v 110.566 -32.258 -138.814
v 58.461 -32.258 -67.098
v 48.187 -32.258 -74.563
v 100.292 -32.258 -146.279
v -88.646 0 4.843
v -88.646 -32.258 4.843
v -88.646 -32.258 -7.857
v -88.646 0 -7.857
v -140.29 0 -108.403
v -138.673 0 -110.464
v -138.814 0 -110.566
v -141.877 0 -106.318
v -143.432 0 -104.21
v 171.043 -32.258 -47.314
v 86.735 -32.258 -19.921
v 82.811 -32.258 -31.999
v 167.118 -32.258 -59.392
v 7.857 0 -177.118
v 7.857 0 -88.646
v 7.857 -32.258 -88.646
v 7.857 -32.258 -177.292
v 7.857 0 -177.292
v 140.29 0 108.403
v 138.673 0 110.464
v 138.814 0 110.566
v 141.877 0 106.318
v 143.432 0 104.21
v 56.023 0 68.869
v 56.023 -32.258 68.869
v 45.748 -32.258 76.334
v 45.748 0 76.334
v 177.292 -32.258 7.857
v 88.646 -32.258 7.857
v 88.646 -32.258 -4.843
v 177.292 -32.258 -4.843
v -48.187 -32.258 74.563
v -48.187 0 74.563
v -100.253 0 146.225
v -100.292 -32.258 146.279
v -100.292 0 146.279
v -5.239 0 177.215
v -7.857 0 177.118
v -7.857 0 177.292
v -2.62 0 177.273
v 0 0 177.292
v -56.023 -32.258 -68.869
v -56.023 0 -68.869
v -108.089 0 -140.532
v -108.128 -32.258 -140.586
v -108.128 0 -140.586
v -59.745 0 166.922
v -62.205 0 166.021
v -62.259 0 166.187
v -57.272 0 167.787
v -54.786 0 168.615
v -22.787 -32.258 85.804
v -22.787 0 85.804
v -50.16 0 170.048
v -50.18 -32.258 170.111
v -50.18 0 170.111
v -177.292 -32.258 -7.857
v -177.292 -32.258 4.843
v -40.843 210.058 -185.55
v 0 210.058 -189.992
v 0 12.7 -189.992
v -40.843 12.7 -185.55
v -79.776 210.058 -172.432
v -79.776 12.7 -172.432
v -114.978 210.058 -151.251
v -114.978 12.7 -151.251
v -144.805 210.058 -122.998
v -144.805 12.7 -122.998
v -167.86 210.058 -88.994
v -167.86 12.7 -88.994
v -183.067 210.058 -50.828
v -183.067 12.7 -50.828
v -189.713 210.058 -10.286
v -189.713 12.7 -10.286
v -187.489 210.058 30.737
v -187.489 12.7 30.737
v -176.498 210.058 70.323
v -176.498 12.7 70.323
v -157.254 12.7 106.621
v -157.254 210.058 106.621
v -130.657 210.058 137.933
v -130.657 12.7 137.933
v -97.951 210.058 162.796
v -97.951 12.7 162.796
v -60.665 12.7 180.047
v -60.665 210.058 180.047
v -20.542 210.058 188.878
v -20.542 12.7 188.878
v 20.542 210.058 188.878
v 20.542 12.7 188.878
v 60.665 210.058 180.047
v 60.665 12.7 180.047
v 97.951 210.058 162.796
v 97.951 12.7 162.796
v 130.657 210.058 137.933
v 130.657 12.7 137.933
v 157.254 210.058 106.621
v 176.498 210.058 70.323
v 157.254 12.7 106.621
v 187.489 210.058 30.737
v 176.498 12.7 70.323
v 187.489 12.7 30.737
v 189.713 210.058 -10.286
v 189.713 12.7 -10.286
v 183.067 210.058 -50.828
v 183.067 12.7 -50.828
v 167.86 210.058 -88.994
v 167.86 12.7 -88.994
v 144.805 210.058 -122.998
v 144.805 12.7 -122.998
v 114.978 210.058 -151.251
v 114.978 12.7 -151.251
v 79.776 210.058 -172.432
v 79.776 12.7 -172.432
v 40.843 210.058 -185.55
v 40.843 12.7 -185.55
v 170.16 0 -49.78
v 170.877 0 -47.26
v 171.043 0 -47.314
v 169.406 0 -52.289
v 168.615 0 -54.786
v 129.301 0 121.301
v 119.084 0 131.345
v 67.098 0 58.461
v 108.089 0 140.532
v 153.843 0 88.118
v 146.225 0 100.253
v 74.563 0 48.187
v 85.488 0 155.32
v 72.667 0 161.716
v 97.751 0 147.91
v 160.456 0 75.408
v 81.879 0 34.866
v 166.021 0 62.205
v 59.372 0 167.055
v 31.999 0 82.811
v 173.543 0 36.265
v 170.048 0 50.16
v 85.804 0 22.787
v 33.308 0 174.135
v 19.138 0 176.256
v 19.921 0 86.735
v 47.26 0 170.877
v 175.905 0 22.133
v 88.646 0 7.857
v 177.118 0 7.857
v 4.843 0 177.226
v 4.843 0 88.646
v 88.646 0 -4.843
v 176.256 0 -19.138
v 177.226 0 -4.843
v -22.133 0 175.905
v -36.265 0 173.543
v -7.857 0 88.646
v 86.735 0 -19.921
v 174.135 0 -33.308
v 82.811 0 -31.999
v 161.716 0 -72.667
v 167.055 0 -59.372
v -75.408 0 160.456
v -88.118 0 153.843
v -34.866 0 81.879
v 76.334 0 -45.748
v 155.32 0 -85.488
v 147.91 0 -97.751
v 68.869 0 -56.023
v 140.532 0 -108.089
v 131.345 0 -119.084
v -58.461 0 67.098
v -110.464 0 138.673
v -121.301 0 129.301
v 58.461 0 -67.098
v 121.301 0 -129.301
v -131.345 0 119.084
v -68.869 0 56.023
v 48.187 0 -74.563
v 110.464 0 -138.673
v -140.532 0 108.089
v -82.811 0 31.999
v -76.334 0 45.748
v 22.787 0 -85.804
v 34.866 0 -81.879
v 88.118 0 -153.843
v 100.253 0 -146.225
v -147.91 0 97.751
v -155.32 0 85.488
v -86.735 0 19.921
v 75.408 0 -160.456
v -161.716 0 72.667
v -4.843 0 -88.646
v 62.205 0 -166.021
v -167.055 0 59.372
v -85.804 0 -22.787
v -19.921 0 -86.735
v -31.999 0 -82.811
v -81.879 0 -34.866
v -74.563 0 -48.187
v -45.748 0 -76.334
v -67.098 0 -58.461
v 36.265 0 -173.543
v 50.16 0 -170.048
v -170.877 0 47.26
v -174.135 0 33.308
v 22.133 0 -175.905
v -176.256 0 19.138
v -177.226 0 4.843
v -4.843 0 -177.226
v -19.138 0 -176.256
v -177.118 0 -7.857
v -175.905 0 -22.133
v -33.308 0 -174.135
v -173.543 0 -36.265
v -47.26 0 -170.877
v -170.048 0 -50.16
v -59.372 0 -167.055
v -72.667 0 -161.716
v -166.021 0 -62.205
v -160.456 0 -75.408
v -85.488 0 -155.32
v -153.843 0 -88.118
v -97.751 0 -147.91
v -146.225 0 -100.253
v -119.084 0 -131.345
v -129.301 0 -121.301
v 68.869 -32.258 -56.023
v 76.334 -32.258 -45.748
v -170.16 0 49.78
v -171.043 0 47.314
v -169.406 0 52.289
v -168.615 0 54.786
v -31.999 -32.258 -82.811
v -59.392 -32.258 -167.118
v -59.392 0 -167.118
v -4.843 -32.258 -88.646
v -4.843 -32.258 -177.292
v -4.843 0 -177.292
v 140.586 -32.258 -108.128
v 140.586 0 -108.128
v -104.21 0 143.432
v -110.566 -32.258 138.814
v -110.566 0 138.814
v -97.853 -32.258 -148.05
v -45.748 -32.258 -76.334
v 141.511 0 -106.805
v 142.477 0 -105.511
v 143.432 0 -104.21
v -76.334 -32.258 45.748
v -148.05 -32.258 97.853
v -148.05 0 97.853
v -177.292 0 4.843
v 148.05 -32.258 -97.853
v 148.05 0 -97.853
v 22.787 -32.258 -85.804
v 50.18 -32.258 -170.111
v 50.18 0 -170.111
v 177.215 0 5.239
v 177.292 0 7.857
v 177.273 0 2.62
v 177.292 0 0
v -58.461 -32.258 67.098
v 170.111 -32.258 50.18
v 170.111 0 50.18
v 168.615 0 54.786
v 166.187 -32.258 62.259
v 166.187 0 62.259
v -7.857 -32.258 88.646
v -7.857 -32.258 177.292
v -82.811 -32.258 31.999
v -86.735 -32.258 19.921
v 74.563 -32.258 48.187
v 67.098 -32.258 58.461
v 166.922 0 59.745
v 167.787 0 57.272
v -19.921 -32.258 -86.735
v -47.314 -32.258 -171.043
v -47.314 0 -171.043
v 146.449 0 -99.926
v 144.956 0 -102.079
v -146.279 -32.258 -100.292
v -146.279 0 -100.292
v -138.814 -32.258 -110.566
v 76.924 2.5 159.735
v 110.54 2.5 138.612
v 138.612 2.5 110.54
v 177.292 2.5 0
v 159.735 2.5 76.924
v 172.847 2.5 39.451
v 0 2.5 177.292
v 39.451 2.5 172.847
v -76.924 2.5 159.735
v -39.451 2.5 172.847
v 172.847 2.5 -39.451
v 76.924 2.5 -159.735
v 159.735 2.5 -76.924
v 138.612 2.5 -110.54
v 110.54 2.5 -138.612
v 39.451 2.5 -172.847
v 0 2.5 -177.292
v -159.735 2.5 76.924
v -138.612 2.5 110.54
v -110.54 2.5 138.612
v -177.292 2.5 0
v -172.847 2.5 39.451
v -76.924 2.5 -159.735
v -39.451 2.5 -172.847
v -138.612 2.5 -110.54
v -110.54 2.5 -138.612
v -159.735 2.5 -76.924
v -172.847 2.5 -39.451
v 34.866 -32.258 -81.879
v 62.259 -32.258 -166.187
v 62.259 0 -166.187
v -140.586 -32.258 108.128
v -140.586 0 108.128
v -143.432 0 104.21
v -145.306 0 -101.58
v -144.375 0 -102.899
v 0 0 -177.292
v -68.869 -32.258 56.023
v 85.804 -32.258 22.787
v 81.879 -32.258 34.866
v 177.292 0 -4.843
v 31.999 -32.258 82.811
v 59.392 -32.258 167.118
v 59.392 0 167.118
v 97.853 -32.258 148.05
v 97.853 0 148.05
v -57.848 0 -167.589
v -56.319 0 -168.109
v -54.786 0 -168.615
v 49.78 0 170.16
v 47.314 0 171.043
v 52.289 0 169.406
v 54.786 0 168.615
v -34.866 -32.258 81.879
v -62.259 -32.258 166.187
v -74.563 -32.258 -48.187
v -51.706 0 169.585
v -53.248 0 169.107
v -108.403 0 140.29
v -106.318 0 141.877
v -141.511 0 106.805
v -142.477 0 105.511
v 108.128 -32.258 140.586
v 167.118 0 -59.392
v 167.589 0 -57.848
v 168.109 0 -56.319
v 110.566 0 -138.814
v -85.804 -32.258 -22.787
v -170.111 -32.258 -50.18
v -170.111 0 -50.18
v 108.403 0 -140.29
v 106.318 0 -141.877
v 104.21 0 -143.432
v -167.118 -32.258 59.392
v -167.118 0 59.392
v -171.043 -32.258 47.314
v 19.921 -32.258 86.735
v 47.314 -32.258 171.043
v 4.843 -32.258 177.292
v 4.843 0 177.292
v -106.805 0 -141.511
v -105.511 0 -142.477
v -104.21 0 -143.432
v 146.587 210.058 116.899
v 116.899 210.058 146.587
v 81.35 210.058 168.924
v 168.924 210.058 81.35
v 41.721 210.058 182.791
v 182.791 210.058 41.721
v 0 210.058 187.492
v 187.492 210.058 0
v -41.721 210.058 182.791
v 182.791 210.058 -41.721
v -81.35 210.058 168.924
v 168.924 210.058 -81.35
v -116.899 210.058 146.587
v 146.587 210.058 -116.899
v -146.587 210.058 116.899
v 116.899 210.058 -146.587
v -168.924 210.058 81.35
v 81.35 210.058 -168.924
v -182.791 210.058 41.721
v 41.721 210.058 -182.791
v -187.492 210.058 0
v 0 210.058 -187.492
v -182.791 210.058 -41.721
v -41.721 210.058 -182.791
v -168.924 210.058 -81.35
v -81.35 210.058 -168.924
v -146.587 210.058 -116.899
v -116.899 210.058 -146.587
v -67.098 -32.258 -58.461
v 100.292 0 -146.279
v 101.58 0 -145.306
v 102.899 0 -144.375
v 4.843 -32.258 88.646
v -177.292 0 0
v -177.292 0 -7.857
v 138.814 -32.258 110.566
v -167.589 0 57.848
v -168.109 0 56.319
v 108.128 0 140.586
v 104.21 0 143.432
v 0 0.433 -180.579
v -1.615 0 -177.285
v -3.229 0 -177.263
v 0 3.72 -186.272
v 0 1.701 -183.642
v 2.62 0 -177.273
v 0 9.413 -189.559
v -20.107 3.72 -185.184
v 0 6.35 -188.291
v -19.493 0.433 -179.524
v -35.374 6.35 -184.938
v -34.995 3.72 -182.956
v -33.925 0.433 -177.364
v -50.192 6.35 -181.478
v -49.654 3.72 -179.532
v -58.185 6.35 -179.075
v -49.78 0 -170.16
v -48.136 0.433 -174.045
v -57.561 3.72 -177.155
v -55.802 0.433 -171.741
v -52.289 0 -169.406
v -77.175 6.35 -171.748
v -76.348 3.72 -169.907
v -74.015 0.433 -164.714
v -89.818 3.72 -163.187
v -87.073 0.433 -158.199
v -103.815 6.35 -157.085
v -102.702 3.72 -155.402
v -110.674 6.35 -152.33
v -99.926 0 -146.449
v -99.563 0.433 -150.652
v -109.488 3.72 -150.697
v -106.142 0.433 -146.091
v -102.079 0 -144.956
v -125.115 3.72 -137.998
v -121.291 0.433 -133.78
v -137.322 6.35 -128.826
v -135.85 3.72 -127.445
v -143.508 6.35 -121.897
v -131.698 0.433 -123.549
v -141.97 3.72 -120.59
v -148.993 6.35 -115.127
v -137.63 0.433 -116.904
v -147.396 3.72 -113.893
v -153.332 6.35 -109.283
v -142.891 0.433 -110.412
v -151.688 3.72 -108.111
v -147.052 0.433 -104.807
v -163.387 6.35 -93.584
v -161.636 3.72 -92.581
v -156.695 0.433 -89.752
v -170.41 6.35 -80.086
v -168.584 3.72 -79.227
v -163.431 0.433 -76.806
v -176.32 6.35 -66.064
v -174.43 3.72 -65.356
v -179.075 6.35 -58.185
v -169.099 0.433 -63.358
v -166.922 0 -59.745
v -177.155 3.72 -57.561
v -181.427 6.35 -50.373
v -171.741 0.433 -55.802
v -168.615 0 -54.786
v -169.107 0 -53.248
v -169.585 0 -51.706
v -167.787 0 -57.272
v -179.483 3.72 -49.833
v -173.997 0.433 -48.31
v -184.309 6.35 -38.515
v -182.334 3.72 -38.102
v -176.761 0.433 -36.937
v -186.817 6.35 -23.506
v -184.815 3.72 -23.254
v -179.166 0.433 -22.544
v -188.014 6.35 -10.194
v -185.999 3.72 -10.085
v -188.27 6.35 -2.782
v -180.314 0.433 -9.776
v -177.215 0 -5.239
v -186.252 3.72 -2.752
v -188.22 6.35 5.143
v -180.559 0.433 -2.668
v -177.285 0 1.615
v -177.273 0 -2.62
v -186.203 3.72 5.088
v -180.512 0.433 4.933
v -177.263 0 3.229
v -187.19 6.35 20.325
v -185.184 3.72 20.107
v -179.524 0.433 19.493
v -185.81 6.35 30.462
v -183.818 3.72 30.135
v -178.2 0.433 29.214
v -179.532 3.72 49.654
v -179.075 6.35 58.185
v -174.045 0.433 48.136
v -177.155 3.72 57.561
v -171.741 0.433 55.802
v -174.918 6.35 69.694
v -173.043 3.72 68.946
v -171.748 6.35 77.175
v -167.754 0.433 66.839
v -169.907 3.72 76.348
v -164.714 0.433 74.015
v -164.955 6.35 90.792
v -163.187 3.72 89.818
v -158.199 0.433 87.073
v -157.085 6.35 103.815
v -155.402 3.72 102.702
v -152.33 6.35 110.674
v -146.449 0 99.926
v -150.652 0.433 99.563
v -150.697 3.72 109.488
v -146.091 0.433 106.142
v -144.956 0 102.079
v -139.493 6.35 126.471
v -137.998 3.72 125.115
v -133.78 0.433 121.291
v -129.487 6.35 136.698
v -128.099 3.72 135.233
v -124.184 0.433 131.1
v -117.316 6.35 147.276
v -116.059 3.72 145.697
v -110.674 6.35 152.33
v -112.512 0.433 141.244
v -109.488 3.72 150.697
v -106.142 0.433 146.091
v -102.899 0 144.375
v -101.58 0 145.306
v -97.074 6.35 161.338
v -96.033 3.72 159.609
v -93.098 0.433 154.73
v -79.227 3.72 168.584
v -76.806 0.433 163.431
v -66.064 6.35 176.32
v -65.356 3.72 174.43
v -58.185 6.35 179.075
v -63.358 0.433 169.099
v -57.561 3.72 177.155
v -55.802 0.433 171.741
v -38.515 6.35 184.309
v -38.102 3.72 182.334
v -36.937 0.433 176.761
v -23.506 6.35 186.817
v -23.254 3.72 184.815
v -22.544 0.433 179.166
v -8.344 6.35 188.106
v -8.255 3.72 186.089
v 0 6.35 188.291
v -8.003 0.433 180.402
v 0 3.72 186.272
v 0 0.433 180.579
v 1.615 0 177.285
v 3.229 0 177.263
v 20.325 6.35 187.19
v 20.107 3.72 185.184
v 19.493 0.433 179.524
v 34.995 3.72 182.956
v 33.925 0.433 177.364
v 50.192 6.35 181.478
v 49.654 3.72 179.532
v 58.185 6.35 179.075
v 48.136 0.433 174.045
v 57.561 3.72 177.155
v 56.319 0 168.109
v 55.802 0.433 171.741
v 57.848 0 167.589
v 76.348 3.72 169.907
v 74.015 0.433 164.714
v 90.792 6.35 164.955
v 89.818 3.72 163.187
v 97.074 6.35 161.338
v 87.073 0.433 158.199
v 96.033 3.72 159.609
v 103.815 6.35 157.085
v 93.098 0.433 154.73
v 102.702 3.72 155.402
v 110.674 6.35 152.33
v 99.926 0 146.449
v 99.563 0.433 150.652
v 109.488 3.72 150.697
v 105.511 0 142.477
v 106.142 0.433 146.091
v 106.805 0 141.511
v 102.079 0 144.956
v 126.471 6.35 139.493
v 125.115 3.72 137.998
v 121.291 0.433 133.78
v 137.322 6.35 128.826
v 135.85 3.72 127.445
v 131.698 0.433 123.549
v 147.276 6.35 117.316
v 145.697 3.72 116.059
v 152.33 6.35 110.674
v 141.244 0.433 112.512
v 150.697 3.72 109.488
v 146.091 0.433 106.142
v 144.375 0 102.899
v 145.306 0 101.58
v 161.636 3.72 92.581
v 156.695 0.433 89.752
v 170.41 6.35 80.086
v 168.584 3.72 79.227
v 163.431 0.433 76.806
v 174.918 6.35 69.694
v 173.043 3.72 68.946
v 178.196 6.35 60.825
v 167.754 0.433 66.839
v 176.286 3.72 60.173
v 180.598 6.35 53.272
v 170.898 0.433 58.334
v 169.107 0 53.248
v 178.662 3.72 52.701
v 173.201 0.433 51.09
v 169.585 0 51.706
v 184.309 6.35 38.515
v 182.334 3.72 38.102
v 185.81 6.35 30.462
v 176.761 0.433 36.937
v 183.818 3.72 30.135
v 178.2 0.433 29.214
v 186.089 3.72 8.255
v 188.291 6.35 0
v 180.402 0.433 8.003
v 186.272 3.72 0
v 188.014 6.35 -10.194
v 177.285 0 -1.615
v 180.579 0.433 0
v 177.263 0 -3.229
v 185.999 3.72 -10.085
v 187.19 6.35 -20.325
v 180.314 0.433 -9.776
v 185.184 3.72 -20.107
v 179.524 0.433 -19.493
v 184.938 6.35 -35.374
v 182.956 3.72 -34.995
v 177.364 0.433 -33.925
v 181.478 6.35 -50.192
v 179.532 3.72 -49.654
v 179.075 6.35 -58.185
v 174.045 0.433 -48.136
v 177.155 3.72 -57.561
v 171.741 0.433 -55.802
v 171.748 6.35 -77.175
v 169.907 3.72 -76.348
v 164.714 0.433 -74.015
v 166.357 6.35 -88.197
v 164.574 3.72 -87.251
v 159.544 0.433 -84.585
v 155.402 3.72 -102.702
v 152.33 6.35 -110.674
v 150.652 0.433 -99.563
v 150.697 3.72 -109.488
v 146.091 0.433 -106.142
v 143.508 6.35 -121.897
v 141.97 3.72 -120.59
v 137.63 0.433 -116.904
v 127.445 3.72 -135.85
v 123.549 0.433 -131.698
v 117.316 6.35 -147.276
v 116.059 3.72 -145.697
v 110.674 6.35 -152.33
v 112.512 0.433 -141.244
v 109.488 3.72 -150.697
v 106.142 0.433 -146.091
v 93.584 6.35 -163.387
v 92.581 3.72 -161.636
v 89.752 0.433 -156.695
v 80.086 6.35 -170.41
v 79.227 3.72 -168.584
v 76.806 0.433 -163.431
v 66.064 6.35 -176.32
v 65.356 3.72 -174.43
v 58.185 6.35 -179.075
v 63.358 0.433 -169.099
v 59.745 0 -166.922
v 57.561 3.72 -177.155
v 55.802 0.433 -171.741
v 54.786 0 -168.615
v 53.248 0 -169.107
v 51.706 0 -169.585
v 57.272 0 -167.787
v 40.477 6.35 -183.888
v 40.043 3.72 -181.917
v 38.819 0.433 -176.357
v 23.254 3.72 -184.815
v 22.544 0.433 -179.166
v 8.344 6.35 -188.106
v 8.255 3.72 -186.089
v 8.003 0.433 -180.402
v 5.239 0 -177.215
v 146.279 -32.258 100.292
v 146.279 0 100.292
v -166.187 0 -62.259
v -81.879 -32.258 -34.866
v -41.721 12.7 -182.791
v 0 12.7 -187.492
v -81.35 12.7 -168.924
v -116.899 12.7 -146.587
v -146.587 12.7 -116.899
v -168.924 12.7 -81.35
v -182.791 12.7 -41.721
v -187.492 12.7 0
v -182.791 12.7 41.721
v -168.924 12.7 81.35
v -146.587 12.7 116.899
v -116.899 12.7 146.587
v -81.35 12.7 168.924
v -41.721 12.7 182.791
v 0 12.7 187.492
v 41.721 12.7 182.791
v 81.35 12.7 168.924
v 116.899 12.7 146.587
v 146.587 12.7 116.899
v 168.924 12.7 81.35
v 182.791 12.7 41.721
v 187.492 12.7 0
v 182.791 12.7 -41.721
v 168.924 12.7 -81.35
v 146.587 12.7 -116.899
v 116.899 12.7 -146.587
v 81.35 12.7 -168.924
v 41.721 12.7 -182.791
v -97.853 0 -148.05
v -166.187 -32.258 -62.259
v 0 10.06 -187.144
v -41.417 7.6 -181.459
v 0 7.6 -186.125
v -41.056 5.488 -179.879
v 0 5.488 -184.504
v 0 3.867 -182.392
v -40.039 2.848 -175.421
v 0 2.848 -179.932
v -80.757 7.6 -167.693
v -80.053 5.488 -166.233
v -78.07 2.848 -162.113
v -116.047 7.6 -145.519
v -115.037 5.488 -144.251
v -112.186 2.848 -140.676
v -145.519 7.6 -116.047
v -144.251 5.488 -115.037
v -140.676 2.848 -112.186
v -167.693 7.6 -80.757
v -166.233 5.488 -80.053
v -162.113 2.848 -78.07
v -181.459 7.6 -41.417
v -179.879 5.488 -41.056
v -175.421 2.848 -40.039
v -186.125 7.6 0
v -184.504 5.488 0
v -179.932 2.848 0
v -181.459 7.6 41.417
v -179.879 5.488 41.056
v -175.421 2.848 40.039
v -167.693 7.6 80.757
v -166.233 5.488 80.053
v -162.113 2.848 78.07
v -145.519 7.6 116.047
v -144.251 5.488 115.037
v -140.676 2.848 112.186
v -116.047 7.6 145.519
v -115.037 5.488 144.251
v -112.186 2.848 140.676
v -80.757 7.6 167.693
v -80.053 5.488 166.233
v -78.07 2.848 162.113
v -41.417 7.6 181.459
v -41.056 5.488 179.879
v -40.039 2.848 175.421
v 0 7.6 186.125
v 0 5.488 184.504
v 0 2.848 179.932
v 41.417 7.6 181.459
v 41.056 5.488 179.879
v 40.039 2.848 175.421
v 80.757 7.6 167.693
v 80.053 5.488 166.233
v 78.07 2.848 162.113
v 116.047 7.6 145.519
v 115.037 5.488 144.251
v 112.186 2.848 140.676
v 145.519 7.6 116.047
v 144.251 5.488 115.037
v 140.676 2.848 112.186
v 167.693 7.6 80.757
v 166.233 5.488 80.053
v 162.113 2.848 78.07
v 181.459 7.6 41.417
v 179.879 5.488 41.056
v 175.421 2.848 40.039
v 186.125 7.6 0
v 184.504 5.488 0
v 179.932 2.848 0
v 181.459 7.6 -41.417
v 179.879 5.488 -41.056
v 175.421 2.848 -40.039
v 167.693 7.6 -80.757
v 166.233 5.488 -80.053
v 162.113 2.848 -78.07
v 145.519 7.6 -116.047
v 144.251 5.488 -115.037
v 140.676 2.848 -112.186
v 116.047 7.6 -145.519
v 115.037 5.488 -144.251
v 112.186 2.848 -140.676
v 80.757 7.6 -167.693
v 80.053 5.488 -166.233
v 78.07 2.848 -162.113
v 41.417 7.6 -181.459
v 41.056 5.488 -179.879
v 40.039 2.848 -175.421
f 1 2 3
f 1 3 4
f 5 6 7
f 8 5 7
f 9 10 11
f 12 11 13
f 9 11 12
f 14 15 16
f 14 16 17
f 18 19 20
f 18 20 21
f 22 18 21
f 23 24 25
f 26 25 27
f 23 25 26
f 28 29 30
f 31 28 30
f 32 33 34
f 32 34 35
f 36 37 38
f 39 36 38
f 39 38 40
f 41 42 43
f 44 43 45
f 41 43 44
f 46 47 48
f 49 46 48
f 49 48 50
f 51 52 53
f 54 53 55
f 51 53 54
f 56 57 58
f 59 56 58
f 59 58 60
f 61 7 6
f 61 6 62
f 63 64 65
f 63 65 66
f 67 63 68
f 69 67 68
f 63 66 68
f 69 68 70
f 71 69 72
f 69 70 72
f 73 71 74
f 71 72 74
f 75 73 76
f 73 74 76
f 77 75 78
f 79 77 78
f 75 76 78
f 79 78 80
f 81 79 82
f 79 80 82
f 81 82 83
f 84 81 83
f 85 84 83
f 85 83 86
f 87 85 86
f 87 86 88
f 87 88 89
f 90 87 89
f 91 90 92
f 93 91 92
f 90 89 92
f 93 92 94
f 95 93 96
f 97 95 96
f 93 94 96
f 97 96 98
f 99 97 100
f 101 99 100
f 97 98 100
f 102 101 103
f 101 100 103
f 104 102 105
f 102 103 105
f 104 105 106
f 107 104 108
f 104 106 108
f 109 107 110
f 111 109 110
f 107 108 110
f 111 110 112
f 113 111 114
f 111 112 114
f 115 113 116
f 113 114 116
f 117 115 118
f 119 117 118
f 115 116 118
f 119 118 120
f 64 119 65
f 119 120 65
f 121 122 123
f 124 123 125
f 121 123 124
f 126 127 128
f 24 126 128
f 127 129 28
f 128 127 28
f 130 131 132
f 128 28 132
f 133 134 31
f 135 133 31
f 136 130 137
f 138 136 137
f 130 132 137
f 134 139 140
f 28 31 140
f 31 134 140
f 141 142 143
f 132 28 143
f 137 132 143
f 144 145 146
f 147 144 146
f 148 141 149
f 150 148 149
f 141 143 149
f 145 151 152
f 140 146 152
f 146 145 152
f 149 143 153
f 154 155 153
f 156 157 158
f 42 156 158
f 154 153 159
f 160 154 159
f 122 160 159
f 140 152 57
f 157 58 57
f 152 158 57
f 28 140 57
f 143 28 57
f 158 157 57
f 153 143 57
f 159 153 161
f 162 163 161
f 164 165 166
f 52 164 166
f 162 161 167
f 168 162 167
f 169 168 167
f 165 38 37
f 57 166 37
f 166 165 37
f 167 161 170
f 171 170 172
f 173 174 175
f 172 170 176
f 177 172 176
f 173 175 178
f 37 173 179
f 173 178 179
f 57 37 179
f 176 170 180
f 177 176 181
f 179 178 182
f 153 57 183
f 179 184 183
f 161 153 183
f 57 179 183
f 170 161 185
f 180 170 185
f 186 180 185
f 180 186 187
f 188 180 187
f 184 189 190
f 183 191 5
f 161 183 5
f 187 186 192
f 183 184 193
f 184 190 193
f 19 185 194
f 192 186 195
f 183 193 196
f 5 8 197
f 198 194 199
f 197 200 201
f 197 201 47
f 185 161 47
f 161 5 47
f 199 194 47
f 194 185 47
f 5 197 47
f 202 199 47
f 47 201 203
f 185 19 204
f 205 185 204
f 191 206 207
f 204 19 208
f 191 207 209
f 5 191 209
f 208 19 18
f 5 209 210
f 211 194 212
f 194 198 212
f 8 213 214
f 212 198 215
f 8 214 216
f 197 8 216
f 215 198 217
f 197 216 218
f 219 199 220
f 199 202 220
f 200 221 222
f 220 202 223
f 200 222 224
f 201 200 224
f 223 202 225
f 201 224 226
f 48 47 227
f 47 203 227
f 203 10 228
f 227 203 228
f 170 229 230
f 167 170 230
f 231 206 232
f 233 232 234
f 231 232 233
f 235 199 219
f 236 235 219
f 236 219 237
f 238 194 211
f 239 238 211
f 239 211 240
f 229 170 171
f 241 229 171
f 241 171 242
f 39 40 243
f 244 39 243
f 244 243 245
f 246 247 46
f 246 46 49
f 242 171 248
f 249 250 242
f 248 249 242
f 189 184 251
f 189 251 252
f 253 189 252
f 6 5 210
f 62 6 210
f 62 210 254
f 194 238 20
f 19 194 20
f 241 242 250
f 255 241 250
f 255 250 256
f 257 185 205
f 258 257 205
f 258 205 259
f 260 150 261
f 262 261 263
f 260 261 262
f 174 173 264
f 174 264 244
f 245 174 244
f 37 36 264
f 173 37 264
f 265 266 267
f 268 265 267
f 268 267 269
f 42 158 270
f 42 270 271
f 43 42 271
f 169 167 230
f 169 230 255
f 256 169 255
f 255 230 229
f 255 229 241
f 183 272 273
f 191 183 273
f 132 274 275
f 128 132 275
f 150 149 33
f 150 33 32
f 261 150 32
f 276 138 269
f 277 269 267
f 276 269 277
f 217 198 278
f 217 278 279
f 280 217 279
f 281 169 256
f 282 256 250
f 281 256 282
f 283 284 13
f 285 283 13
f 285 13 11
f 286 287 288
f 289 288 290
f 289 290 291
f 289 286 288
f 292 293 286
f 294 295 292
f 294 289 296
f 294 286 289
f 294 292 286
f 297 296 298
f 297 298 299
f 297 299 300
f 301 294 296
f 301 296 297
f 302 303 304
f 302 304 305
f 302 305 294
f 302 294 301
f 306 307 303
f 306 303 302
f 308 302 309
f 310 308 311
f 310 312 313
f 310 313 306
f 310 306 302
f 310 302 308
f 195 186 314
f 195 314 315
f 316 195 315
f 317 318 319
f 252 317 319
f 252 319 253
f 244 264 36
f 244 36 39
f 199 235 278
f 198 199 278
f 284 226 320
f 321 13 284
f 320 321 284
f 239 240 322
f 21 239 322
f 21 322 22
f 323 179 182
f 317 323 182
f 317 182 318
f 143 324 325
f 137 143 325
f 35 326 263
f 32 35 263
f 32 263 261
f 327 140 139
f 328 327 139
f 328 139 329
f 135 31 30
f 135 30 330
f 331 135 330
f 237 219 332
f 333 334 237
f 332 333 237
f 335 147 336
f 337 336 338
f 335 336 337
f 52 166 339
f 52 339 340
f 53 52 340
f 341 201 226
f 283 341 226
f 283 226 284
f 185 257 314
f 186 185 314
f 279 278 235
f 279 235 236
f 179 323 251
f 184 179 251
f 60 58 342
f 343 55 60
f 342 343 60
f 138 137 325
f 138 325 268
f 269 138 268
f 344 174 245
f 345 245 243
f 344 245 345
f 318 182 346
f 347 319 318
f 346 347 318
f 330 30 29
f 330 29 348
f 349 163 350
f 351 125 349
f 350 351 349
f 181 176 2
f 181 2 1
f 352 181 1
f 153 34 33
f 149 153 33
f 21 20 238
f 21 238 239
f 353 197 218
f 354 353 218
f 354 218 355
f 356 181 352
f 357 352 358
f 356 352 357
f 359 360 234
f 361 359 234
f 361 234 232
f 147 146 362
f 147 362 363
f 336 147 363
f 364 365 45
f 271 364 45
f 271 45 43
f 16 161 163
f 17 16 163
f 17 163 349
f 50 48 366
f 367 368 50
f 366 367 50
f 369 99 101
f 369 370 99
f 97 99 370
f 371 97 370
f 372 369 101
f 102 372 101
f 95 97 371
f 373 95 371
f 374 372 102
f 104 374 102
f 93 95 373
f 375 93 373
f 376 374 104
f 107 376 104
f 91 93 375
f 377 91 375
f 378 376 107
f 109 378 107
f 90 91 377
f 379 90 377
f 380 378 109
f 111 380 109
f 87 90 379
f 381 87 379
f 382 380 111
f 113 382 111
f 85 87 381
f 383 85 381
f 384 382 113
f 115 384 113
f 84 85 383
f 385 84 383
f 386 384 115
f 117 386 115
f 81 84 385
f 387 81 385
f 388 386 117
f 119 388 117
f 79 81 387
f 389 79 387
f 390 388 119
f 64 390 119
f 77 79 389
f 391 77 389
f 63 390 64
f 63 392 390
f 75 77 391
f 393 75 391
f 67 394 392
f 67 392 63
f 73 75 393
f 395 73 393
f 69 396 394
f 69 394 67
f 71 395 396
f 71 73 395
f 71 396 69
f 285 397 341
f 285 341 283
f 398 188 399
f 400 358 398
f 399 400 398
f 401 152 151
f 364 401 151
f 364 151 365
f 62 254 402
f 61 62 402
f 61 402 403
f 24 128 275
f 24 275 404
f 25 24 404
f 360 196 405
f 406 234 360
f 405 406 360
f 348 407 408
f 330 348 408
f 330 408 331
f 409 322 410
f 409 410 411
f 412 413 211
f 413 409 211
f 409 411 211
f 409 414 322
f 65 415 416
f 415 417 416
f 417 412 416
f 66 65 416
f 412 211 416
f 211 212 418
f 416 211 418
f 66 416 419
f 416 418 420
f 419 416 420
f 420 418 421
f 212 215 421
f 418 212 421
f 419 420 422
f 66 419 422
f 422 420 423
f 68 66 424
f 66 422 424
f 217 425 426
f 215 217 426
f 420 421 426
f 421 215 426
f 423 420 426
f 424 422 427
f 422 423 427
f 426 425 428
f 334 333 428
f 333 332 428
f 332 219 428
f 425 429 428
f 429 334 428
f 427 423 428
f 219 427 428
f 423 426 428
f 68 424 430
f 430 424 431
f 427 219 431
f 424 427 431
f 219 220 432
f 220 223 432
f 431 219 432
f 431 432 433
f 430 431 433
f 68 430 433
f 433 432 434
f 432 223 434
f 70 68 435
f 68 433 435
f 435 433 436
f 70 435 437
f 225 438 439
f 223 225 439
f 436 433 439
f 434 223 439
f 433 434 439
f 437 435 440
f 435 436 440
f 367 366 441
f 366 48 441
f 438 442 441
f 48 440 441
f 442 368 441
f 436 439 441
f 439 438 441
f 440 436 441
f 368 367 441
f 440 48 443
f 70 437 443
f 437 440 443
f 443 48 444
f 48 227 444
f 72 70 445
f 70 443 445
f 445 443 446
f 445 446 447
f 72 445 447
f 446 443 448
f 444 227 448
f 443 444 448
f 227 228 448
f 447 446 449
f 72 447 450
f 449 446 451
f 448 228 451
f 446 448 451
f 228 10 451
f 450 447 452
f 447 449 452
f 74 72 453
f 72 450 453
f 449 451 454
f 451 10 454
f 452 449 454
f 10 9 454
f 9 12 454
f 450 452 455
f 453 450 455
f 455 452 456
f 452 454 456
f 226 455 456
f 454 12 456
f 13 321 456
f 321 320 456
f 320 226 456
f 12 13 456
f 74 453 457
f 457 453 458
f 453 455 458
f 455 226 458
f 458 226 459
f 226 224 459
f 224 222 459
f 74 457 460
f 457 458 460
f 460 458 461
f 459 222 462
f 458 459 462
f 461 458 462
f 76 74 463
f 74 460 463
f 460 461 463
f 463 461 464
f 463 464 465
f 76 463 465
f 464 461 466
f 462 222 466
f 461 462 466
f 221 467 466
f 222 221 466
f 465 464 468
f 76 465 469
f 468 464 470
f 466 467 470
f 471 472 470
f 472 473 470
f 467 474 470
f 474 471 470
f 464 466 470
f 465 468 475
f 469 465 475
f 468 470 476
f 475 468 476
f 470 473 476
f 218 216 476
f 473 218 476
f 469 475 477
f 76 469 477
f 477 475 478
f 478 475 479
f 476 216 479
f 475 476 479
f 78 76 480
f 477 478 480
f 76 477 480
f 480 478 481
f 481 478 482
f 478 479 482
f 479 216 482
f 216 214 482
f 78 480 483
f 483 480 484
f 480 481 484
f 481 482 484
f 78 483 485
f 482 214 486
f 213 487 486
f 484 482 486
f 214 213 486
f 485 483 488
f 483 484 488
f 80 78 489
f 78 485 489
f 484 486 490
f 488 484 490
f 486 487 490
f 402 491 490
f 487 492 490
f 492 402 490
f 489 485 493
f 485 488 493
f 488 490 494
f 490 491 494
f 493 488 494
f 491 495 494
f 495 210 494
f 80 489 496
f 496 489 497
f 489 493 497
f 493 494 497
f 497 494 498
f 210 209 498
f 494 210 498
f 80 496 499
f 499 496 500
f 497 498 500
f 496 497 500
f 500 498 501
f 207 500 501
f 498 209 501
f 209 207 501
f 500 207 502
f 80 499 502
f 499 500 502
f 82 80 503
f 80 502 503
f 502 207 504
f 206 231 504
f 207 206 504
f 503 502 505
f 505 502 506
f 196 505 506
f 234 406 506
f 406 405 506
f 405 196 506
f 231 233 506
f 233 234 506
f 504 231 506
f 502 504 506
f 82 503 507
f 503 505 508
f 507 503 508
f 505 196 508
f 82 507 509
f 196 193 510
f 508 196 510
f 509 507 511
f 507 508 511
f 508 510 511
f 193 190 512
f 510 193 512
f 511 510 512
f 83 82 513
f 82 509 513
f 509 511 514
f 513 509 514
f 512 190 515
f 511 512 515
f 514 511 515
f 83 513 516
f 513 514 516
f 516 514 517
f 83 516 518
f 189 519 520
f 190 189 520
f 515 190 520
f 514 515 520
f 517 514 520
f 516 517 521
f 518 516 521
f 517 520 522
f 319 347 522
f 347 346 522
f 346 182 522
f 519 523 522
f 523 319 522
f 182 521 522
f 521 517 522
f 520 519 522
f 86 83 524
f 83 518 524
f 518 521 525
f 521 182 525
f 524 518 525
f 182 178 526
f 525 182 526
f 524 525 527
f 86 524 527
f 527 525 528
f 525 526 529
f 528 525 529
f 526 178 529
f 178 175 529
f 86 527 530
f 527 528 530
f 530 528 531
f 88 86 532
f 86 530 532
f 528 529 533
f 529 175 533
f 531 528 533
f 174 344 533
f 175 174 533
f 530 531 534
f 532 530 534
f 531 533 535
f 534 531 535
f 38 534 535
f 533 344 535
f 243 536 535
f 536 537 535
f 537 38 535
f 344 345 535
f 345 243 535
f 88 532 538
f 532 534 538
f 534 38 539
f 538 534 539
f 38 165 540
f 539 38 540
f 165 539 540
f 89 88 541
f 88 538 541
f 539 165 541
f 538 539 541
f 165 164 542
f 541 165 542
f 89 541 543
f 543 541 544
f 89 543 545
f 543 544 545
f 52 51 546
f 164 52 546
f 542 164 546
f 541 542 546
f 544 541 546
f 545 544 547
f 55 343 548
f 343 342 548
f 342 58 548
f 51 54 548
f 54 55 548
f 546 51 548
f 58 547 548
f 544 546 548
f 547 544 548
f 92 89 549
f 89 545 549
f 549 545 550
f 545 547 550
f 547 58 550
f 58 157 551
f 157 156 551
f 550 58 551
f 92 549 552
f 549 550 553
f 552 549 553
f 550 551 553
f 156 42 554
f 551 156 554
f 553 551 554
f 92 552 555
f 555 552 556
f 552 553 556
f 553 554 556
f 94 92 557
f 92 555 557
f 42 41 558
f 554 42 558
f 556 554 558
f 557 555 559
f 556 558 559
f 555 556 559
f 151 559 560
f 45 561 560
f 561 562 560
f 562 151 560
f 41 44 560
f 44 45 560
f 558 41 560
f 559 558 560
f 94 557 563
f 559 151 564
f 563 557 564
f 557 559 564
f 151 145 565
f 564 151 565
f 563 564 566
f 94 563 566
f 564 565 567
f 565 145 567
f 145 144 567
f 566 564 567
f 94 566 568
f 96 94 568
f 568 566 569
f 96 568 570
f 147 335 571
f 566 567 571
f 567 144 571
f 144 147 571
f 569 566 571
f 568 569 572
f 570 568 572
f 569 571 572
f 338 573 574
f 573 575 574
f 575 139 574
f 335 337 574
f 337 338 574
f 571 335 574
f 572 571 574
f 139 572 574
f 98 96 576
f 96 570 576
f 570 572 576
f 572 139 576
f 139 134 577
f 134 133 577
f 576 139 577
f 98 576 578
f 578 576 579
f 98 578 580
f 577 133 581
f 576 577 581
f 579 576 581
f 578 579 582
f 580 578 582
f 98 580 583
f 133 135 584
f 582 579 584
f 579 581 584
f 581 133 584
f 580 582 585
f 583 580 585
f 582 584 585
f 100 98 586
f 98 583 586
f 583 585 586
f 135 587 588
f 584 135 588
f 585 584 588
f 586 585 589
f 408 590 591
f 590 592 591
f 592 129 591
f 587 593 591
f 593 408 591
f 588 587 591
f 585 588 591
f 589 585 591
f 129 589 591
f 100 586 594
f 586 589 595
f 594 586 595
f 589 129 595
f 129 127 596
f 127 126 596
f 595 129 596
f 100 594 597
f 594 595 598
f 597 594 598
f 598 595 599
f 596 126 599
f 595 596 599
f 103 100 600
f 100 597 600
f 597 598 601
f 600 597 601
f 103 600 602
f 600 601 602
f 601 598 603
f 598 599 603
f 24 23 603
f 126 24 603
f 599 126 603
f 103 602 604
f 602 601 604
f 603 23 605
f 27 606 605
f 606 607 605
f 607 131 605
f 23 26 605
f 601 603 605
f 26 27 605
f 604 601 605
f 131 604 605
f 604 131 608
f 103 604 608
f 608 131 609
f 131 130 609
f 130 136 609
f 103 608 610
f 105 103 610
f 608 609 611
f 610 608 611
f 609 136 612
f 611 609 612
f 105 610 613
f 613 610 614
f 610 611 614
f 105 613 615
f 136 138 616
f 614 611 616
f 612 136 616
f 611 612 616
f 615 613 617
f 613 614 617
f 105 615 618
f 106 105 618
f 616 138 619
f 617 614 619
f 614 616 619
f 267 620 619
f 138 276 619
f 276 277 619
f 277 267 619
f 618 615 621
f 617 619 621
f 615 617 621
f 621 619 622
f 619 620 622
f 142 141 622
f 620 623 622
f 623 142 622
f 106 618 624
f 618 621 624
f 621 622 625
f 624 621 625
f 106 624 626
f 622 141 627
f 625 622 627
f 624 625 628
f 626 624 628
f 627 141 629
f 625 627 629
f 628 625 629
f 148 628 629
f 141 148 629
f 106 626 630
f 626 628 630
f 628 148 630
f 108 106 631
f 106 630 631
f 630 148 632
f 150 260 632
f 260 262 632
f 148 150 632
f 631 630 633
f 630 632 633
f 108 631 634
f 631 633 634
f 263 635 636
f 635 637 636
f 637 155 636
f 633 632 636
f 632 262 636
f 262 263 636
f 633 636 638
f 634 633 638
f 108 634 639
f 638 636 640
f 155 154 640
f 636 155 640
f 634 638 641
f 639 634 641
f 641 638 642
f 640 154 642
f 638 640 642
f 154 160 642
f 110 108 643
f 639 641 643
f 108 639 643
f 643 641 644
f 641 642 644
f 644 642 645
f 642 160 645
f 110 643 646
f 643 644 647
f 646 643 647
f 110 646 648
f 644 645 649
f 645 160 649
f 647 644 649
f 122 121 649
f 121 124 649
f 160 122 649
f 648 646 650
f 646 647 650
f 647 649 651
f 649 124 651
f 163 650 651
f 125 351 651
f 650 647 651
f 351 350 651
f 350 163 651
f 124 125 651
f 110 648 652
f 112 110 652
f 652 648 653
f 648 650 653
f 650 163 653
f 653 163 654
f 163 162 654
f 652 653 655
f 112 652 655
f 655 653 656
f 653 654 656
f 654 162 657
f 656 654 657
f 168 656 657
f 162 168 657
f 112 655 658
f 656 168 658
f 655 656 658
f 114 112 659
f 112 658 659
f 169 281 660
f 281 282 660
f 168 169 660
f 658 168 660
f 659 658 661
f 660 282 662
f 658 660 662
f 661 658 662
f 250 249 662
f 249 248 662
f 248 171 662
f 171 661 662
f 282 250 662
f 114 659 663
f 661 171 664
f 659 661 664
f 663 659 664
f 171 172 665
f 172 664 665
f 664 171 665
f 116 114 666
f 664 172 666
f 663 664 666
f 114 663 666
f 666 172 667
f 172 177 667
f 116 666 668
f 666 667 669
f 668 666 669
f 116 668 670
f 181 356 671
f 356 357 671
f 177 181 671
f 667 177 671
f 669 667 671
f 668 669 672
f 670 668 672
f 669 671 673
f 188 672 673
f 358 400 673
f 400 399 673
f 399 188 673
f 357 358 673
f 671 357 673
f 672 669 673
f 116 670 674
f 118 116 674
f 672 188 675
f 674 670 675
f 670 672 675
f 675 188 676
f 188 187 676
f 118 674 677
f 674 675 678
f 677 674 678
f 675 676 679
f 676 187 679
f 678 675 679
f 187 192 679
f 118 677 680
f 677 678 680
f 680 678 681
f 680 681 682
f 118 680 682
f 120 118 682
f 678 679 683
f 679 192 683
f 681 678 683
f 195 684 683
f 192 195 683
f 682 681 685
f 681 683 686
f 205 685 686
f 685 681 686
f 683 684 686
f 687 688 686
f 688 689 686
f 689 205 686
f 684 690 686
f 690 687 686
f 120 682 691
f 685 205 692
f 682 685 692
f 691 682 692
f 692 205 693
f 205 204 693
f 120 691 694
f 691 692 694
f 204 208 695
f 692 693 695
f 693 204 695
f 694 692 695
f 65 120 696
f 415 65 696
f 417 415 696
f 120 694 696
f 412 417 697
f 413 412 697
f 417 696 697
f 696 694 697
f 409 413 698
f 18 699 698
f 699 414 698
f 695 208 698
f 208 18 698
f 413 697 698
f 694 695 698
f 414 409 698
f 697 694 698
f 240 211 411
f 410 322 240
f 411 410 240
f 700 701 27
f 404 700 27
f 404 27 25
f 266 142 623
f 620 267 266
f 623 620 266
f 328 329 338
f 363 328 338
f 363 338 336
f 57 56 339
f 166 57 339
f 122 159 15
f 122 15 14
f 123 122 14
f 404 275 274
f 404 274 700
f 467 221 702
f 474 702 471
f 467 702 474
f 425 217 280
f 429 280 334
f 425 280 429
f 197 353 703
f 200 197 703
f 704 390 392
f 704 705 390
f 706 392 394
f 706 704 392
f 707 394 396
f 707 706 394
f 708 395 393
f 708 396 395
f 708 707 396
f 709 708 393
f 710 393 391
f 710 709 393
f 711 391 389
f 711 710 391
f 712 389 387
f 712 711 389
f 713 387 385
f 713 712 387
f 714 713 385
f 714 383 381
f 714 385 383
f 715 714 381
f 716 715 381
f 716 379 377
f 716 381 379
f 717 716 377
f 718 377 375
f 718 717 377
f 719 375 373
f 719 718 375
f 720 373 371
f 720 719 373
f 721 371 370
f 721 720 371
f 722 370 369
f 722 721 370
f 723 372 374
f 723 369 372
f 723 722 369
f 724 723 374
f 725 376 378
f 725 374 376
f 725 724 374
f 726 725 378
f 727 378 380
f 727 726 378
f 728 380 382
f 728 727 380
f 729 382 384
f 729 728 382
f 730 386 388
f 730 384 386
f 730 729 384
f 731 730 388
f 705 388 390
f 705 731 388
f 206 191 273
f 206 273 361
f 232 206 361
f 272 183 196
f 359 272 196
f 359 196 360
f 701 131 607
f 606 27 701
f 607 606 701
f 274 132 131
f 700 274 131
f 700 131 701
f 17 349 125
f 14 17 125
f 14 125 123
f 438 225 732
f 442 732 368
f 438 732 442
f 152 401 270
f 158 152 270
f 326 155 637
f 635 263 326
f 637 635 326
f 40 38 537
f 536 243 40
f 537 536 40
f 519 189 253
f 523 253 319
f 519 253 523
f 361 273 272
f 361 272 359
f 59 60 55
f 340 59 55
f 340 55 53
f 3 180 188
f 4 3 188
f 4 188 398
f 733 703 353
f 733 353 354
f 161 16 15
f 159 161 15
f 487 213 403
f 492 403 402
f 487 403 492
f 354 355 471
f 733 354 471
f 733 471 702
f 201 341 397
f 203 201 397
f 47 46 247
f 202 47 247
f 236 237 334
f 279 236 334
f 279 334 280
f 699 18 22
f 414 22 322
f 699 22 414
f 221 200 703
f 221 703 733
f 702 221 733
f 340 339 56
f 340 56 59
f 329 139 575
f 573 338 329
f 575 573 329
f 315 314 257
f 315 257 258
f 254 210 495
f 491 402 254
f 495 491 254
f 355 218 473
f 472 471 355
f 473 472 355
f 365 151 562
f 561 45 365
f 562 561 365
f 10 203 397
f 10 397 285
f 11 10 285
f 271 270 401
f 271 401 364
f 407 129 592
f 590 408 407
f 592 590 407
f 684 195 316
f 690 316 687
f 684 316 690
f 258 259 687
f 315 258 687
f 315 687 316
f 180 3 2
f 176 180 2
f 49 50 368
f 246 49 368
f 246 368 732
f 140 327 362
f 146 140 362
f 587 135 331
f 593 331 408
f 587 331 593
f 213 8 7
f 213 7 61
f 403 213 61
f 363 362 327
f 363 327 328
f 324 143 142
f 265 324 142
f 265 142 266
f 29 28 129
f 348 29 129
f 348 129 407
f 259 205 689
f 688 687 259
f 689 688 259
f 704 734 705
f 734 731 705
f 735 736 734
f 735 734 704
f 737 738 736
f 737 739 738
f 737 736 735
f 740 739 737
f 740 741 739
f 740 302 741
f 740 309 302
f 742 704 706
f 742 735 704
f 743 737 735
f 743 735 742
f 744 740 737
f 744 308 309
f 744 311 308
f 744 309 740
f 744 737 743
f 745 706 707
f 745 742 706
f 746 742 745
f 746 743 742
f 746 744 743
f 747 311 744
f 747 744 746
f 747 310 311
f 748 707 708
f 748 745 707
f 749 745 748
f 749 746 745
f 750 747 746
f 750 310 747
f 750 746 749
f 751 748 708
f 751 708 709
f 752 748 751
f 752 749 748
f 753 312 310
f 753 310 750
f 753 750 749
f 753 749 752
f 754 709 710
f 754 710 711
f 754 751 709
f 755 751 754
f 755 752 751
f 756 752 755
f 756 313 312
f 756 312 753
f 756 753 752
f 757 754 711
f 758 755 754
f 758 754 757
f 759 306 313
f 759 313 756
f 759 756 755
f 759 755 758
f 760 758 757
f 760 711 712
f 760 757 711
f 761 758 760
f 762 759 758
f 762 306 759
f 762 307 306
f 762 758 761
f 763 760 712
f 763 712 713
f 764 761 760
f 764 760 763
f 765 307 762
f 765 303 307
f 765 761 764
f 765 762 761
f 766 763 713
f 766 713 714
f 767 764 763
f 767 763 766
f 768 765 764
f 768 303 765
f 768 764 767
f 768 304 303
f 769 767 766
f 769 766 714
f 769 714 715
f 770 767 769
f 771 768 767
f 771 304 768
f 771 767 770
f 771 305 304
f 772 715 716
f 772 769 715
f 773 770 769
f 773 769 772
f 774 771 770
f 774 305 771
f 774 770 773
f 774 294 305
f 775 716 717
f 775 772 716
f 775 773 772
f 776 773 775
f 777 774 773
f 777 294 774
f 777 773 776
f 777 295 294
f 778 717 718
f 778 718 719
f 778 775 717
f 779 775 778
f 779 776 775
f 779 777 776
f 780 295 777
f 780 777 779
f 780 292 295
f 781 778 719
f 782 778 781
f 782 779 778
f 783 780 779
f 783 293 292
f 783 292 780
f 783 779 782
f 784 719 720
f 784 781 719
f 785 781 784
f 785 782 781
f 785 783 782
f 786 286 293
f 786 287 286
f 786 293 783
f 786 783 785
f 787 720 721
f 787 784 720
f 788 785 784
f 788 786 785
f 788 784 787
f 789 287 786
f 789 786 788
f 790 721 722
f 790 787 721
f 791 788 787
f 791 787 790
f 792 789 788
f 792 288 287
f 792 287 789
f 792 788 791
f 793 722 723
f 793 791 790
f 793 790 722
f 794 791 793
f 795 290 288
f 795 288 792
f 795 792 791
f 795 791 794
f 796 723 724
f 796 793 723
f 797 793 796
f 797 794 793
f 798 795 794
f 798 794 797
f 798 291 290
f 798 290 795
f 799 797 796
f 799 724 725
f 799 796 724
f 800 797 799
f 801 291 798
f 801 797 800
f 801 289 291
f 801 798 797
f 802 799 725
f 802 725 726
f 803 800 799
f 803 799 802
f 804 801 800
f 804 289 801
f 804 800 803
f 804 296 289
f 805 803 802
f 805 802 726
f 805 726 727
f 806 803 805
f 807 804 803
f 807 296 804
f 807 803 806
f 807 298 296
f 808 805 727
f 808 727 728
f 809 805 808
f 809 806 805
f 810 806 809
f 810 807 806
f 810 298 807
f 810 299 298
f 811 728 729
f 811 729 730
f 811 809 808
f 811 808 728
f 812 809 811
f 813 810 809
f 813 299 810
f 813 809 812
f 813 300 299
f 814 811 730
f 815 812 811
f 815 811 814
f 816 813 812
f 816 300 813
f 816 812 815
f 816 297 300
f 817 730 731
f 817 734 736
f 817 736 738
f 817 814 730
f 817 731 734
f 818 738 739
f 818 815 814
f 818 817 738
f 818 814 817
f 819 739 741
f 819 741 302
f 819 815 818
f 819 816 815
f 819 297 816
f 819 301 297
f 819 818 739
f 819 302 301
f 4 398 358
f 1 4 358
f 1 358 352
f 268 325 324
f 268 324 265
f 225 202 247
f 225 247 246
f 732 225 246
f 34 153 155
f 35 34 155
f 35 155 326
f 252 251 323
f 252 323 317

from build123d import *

# Parameters (mm, degrees)
SKETCH1_R           = 189.992
BOSS_EXTRUDE1_DEPTH = 210.058
FILLET1_R           = 12.7
SHELL1_T            = -2.5
SKETCH2_W           = 88.646
SKETCH2_H           = 12.7
BOSS_EXTRUDE2_DEPTH = 32.258
CIRPATTERN1_COUNT   = 20


with BuildPart() as part:
    # Sketch1 → Boss-Extrude1 (new body)
    with BuildSketch(Plane(origin=(0, 0, 0), x_dir=(1, 0, 0), z_dir=(0, 1, 0))):
        Circle(SKETCH1_R)
    extrude(amount=BOSS_EXTRUDE1_DEPTH)

    # Fillet1
    fillet1_edges = [part.edges().sort_by_distance(p)[0] for p in [
        (-189.992, 0, 0),
    ]]
    fillet(fillet1_edges, radius=FILLET1_R)

    # Shell1
    shell1_openings = [part.faces().sort_by_distance(p)[0] for p in [
        (0, 210.058, 0),
    ]]
    offset(amount=SHELL1_T, openings=shell1_openings, kind=Kind.INTERSECTION)

    # Sketch2 → Boss-Extrude2 (add)
    with BuildSketch(Plane(origin=(0, 0, 0), x_dir=(-1, 0, 0), z_dir=(0, -1, 0))):
        with Locations((132.969, 1.507022024)):
            Rectangle(SKETCH2_W, SKETCH2_H)
    boss_extrude2 = extrude(amount=BOSS_EXTRUDE2_DEPTH)

    # CirPattern1: Boss-Extrude2 ×20 about axis
    cirpattern1_axis = Axis((0, 210.058, 0), (0, -1, 0))
    for i in range(1, CIRPATTERN1_COUNT):
        add(boss_extrude2.rotate(cirpattern1_axis, i * 360 / CIRPATTERN1_COUNT))


solid = part.part
